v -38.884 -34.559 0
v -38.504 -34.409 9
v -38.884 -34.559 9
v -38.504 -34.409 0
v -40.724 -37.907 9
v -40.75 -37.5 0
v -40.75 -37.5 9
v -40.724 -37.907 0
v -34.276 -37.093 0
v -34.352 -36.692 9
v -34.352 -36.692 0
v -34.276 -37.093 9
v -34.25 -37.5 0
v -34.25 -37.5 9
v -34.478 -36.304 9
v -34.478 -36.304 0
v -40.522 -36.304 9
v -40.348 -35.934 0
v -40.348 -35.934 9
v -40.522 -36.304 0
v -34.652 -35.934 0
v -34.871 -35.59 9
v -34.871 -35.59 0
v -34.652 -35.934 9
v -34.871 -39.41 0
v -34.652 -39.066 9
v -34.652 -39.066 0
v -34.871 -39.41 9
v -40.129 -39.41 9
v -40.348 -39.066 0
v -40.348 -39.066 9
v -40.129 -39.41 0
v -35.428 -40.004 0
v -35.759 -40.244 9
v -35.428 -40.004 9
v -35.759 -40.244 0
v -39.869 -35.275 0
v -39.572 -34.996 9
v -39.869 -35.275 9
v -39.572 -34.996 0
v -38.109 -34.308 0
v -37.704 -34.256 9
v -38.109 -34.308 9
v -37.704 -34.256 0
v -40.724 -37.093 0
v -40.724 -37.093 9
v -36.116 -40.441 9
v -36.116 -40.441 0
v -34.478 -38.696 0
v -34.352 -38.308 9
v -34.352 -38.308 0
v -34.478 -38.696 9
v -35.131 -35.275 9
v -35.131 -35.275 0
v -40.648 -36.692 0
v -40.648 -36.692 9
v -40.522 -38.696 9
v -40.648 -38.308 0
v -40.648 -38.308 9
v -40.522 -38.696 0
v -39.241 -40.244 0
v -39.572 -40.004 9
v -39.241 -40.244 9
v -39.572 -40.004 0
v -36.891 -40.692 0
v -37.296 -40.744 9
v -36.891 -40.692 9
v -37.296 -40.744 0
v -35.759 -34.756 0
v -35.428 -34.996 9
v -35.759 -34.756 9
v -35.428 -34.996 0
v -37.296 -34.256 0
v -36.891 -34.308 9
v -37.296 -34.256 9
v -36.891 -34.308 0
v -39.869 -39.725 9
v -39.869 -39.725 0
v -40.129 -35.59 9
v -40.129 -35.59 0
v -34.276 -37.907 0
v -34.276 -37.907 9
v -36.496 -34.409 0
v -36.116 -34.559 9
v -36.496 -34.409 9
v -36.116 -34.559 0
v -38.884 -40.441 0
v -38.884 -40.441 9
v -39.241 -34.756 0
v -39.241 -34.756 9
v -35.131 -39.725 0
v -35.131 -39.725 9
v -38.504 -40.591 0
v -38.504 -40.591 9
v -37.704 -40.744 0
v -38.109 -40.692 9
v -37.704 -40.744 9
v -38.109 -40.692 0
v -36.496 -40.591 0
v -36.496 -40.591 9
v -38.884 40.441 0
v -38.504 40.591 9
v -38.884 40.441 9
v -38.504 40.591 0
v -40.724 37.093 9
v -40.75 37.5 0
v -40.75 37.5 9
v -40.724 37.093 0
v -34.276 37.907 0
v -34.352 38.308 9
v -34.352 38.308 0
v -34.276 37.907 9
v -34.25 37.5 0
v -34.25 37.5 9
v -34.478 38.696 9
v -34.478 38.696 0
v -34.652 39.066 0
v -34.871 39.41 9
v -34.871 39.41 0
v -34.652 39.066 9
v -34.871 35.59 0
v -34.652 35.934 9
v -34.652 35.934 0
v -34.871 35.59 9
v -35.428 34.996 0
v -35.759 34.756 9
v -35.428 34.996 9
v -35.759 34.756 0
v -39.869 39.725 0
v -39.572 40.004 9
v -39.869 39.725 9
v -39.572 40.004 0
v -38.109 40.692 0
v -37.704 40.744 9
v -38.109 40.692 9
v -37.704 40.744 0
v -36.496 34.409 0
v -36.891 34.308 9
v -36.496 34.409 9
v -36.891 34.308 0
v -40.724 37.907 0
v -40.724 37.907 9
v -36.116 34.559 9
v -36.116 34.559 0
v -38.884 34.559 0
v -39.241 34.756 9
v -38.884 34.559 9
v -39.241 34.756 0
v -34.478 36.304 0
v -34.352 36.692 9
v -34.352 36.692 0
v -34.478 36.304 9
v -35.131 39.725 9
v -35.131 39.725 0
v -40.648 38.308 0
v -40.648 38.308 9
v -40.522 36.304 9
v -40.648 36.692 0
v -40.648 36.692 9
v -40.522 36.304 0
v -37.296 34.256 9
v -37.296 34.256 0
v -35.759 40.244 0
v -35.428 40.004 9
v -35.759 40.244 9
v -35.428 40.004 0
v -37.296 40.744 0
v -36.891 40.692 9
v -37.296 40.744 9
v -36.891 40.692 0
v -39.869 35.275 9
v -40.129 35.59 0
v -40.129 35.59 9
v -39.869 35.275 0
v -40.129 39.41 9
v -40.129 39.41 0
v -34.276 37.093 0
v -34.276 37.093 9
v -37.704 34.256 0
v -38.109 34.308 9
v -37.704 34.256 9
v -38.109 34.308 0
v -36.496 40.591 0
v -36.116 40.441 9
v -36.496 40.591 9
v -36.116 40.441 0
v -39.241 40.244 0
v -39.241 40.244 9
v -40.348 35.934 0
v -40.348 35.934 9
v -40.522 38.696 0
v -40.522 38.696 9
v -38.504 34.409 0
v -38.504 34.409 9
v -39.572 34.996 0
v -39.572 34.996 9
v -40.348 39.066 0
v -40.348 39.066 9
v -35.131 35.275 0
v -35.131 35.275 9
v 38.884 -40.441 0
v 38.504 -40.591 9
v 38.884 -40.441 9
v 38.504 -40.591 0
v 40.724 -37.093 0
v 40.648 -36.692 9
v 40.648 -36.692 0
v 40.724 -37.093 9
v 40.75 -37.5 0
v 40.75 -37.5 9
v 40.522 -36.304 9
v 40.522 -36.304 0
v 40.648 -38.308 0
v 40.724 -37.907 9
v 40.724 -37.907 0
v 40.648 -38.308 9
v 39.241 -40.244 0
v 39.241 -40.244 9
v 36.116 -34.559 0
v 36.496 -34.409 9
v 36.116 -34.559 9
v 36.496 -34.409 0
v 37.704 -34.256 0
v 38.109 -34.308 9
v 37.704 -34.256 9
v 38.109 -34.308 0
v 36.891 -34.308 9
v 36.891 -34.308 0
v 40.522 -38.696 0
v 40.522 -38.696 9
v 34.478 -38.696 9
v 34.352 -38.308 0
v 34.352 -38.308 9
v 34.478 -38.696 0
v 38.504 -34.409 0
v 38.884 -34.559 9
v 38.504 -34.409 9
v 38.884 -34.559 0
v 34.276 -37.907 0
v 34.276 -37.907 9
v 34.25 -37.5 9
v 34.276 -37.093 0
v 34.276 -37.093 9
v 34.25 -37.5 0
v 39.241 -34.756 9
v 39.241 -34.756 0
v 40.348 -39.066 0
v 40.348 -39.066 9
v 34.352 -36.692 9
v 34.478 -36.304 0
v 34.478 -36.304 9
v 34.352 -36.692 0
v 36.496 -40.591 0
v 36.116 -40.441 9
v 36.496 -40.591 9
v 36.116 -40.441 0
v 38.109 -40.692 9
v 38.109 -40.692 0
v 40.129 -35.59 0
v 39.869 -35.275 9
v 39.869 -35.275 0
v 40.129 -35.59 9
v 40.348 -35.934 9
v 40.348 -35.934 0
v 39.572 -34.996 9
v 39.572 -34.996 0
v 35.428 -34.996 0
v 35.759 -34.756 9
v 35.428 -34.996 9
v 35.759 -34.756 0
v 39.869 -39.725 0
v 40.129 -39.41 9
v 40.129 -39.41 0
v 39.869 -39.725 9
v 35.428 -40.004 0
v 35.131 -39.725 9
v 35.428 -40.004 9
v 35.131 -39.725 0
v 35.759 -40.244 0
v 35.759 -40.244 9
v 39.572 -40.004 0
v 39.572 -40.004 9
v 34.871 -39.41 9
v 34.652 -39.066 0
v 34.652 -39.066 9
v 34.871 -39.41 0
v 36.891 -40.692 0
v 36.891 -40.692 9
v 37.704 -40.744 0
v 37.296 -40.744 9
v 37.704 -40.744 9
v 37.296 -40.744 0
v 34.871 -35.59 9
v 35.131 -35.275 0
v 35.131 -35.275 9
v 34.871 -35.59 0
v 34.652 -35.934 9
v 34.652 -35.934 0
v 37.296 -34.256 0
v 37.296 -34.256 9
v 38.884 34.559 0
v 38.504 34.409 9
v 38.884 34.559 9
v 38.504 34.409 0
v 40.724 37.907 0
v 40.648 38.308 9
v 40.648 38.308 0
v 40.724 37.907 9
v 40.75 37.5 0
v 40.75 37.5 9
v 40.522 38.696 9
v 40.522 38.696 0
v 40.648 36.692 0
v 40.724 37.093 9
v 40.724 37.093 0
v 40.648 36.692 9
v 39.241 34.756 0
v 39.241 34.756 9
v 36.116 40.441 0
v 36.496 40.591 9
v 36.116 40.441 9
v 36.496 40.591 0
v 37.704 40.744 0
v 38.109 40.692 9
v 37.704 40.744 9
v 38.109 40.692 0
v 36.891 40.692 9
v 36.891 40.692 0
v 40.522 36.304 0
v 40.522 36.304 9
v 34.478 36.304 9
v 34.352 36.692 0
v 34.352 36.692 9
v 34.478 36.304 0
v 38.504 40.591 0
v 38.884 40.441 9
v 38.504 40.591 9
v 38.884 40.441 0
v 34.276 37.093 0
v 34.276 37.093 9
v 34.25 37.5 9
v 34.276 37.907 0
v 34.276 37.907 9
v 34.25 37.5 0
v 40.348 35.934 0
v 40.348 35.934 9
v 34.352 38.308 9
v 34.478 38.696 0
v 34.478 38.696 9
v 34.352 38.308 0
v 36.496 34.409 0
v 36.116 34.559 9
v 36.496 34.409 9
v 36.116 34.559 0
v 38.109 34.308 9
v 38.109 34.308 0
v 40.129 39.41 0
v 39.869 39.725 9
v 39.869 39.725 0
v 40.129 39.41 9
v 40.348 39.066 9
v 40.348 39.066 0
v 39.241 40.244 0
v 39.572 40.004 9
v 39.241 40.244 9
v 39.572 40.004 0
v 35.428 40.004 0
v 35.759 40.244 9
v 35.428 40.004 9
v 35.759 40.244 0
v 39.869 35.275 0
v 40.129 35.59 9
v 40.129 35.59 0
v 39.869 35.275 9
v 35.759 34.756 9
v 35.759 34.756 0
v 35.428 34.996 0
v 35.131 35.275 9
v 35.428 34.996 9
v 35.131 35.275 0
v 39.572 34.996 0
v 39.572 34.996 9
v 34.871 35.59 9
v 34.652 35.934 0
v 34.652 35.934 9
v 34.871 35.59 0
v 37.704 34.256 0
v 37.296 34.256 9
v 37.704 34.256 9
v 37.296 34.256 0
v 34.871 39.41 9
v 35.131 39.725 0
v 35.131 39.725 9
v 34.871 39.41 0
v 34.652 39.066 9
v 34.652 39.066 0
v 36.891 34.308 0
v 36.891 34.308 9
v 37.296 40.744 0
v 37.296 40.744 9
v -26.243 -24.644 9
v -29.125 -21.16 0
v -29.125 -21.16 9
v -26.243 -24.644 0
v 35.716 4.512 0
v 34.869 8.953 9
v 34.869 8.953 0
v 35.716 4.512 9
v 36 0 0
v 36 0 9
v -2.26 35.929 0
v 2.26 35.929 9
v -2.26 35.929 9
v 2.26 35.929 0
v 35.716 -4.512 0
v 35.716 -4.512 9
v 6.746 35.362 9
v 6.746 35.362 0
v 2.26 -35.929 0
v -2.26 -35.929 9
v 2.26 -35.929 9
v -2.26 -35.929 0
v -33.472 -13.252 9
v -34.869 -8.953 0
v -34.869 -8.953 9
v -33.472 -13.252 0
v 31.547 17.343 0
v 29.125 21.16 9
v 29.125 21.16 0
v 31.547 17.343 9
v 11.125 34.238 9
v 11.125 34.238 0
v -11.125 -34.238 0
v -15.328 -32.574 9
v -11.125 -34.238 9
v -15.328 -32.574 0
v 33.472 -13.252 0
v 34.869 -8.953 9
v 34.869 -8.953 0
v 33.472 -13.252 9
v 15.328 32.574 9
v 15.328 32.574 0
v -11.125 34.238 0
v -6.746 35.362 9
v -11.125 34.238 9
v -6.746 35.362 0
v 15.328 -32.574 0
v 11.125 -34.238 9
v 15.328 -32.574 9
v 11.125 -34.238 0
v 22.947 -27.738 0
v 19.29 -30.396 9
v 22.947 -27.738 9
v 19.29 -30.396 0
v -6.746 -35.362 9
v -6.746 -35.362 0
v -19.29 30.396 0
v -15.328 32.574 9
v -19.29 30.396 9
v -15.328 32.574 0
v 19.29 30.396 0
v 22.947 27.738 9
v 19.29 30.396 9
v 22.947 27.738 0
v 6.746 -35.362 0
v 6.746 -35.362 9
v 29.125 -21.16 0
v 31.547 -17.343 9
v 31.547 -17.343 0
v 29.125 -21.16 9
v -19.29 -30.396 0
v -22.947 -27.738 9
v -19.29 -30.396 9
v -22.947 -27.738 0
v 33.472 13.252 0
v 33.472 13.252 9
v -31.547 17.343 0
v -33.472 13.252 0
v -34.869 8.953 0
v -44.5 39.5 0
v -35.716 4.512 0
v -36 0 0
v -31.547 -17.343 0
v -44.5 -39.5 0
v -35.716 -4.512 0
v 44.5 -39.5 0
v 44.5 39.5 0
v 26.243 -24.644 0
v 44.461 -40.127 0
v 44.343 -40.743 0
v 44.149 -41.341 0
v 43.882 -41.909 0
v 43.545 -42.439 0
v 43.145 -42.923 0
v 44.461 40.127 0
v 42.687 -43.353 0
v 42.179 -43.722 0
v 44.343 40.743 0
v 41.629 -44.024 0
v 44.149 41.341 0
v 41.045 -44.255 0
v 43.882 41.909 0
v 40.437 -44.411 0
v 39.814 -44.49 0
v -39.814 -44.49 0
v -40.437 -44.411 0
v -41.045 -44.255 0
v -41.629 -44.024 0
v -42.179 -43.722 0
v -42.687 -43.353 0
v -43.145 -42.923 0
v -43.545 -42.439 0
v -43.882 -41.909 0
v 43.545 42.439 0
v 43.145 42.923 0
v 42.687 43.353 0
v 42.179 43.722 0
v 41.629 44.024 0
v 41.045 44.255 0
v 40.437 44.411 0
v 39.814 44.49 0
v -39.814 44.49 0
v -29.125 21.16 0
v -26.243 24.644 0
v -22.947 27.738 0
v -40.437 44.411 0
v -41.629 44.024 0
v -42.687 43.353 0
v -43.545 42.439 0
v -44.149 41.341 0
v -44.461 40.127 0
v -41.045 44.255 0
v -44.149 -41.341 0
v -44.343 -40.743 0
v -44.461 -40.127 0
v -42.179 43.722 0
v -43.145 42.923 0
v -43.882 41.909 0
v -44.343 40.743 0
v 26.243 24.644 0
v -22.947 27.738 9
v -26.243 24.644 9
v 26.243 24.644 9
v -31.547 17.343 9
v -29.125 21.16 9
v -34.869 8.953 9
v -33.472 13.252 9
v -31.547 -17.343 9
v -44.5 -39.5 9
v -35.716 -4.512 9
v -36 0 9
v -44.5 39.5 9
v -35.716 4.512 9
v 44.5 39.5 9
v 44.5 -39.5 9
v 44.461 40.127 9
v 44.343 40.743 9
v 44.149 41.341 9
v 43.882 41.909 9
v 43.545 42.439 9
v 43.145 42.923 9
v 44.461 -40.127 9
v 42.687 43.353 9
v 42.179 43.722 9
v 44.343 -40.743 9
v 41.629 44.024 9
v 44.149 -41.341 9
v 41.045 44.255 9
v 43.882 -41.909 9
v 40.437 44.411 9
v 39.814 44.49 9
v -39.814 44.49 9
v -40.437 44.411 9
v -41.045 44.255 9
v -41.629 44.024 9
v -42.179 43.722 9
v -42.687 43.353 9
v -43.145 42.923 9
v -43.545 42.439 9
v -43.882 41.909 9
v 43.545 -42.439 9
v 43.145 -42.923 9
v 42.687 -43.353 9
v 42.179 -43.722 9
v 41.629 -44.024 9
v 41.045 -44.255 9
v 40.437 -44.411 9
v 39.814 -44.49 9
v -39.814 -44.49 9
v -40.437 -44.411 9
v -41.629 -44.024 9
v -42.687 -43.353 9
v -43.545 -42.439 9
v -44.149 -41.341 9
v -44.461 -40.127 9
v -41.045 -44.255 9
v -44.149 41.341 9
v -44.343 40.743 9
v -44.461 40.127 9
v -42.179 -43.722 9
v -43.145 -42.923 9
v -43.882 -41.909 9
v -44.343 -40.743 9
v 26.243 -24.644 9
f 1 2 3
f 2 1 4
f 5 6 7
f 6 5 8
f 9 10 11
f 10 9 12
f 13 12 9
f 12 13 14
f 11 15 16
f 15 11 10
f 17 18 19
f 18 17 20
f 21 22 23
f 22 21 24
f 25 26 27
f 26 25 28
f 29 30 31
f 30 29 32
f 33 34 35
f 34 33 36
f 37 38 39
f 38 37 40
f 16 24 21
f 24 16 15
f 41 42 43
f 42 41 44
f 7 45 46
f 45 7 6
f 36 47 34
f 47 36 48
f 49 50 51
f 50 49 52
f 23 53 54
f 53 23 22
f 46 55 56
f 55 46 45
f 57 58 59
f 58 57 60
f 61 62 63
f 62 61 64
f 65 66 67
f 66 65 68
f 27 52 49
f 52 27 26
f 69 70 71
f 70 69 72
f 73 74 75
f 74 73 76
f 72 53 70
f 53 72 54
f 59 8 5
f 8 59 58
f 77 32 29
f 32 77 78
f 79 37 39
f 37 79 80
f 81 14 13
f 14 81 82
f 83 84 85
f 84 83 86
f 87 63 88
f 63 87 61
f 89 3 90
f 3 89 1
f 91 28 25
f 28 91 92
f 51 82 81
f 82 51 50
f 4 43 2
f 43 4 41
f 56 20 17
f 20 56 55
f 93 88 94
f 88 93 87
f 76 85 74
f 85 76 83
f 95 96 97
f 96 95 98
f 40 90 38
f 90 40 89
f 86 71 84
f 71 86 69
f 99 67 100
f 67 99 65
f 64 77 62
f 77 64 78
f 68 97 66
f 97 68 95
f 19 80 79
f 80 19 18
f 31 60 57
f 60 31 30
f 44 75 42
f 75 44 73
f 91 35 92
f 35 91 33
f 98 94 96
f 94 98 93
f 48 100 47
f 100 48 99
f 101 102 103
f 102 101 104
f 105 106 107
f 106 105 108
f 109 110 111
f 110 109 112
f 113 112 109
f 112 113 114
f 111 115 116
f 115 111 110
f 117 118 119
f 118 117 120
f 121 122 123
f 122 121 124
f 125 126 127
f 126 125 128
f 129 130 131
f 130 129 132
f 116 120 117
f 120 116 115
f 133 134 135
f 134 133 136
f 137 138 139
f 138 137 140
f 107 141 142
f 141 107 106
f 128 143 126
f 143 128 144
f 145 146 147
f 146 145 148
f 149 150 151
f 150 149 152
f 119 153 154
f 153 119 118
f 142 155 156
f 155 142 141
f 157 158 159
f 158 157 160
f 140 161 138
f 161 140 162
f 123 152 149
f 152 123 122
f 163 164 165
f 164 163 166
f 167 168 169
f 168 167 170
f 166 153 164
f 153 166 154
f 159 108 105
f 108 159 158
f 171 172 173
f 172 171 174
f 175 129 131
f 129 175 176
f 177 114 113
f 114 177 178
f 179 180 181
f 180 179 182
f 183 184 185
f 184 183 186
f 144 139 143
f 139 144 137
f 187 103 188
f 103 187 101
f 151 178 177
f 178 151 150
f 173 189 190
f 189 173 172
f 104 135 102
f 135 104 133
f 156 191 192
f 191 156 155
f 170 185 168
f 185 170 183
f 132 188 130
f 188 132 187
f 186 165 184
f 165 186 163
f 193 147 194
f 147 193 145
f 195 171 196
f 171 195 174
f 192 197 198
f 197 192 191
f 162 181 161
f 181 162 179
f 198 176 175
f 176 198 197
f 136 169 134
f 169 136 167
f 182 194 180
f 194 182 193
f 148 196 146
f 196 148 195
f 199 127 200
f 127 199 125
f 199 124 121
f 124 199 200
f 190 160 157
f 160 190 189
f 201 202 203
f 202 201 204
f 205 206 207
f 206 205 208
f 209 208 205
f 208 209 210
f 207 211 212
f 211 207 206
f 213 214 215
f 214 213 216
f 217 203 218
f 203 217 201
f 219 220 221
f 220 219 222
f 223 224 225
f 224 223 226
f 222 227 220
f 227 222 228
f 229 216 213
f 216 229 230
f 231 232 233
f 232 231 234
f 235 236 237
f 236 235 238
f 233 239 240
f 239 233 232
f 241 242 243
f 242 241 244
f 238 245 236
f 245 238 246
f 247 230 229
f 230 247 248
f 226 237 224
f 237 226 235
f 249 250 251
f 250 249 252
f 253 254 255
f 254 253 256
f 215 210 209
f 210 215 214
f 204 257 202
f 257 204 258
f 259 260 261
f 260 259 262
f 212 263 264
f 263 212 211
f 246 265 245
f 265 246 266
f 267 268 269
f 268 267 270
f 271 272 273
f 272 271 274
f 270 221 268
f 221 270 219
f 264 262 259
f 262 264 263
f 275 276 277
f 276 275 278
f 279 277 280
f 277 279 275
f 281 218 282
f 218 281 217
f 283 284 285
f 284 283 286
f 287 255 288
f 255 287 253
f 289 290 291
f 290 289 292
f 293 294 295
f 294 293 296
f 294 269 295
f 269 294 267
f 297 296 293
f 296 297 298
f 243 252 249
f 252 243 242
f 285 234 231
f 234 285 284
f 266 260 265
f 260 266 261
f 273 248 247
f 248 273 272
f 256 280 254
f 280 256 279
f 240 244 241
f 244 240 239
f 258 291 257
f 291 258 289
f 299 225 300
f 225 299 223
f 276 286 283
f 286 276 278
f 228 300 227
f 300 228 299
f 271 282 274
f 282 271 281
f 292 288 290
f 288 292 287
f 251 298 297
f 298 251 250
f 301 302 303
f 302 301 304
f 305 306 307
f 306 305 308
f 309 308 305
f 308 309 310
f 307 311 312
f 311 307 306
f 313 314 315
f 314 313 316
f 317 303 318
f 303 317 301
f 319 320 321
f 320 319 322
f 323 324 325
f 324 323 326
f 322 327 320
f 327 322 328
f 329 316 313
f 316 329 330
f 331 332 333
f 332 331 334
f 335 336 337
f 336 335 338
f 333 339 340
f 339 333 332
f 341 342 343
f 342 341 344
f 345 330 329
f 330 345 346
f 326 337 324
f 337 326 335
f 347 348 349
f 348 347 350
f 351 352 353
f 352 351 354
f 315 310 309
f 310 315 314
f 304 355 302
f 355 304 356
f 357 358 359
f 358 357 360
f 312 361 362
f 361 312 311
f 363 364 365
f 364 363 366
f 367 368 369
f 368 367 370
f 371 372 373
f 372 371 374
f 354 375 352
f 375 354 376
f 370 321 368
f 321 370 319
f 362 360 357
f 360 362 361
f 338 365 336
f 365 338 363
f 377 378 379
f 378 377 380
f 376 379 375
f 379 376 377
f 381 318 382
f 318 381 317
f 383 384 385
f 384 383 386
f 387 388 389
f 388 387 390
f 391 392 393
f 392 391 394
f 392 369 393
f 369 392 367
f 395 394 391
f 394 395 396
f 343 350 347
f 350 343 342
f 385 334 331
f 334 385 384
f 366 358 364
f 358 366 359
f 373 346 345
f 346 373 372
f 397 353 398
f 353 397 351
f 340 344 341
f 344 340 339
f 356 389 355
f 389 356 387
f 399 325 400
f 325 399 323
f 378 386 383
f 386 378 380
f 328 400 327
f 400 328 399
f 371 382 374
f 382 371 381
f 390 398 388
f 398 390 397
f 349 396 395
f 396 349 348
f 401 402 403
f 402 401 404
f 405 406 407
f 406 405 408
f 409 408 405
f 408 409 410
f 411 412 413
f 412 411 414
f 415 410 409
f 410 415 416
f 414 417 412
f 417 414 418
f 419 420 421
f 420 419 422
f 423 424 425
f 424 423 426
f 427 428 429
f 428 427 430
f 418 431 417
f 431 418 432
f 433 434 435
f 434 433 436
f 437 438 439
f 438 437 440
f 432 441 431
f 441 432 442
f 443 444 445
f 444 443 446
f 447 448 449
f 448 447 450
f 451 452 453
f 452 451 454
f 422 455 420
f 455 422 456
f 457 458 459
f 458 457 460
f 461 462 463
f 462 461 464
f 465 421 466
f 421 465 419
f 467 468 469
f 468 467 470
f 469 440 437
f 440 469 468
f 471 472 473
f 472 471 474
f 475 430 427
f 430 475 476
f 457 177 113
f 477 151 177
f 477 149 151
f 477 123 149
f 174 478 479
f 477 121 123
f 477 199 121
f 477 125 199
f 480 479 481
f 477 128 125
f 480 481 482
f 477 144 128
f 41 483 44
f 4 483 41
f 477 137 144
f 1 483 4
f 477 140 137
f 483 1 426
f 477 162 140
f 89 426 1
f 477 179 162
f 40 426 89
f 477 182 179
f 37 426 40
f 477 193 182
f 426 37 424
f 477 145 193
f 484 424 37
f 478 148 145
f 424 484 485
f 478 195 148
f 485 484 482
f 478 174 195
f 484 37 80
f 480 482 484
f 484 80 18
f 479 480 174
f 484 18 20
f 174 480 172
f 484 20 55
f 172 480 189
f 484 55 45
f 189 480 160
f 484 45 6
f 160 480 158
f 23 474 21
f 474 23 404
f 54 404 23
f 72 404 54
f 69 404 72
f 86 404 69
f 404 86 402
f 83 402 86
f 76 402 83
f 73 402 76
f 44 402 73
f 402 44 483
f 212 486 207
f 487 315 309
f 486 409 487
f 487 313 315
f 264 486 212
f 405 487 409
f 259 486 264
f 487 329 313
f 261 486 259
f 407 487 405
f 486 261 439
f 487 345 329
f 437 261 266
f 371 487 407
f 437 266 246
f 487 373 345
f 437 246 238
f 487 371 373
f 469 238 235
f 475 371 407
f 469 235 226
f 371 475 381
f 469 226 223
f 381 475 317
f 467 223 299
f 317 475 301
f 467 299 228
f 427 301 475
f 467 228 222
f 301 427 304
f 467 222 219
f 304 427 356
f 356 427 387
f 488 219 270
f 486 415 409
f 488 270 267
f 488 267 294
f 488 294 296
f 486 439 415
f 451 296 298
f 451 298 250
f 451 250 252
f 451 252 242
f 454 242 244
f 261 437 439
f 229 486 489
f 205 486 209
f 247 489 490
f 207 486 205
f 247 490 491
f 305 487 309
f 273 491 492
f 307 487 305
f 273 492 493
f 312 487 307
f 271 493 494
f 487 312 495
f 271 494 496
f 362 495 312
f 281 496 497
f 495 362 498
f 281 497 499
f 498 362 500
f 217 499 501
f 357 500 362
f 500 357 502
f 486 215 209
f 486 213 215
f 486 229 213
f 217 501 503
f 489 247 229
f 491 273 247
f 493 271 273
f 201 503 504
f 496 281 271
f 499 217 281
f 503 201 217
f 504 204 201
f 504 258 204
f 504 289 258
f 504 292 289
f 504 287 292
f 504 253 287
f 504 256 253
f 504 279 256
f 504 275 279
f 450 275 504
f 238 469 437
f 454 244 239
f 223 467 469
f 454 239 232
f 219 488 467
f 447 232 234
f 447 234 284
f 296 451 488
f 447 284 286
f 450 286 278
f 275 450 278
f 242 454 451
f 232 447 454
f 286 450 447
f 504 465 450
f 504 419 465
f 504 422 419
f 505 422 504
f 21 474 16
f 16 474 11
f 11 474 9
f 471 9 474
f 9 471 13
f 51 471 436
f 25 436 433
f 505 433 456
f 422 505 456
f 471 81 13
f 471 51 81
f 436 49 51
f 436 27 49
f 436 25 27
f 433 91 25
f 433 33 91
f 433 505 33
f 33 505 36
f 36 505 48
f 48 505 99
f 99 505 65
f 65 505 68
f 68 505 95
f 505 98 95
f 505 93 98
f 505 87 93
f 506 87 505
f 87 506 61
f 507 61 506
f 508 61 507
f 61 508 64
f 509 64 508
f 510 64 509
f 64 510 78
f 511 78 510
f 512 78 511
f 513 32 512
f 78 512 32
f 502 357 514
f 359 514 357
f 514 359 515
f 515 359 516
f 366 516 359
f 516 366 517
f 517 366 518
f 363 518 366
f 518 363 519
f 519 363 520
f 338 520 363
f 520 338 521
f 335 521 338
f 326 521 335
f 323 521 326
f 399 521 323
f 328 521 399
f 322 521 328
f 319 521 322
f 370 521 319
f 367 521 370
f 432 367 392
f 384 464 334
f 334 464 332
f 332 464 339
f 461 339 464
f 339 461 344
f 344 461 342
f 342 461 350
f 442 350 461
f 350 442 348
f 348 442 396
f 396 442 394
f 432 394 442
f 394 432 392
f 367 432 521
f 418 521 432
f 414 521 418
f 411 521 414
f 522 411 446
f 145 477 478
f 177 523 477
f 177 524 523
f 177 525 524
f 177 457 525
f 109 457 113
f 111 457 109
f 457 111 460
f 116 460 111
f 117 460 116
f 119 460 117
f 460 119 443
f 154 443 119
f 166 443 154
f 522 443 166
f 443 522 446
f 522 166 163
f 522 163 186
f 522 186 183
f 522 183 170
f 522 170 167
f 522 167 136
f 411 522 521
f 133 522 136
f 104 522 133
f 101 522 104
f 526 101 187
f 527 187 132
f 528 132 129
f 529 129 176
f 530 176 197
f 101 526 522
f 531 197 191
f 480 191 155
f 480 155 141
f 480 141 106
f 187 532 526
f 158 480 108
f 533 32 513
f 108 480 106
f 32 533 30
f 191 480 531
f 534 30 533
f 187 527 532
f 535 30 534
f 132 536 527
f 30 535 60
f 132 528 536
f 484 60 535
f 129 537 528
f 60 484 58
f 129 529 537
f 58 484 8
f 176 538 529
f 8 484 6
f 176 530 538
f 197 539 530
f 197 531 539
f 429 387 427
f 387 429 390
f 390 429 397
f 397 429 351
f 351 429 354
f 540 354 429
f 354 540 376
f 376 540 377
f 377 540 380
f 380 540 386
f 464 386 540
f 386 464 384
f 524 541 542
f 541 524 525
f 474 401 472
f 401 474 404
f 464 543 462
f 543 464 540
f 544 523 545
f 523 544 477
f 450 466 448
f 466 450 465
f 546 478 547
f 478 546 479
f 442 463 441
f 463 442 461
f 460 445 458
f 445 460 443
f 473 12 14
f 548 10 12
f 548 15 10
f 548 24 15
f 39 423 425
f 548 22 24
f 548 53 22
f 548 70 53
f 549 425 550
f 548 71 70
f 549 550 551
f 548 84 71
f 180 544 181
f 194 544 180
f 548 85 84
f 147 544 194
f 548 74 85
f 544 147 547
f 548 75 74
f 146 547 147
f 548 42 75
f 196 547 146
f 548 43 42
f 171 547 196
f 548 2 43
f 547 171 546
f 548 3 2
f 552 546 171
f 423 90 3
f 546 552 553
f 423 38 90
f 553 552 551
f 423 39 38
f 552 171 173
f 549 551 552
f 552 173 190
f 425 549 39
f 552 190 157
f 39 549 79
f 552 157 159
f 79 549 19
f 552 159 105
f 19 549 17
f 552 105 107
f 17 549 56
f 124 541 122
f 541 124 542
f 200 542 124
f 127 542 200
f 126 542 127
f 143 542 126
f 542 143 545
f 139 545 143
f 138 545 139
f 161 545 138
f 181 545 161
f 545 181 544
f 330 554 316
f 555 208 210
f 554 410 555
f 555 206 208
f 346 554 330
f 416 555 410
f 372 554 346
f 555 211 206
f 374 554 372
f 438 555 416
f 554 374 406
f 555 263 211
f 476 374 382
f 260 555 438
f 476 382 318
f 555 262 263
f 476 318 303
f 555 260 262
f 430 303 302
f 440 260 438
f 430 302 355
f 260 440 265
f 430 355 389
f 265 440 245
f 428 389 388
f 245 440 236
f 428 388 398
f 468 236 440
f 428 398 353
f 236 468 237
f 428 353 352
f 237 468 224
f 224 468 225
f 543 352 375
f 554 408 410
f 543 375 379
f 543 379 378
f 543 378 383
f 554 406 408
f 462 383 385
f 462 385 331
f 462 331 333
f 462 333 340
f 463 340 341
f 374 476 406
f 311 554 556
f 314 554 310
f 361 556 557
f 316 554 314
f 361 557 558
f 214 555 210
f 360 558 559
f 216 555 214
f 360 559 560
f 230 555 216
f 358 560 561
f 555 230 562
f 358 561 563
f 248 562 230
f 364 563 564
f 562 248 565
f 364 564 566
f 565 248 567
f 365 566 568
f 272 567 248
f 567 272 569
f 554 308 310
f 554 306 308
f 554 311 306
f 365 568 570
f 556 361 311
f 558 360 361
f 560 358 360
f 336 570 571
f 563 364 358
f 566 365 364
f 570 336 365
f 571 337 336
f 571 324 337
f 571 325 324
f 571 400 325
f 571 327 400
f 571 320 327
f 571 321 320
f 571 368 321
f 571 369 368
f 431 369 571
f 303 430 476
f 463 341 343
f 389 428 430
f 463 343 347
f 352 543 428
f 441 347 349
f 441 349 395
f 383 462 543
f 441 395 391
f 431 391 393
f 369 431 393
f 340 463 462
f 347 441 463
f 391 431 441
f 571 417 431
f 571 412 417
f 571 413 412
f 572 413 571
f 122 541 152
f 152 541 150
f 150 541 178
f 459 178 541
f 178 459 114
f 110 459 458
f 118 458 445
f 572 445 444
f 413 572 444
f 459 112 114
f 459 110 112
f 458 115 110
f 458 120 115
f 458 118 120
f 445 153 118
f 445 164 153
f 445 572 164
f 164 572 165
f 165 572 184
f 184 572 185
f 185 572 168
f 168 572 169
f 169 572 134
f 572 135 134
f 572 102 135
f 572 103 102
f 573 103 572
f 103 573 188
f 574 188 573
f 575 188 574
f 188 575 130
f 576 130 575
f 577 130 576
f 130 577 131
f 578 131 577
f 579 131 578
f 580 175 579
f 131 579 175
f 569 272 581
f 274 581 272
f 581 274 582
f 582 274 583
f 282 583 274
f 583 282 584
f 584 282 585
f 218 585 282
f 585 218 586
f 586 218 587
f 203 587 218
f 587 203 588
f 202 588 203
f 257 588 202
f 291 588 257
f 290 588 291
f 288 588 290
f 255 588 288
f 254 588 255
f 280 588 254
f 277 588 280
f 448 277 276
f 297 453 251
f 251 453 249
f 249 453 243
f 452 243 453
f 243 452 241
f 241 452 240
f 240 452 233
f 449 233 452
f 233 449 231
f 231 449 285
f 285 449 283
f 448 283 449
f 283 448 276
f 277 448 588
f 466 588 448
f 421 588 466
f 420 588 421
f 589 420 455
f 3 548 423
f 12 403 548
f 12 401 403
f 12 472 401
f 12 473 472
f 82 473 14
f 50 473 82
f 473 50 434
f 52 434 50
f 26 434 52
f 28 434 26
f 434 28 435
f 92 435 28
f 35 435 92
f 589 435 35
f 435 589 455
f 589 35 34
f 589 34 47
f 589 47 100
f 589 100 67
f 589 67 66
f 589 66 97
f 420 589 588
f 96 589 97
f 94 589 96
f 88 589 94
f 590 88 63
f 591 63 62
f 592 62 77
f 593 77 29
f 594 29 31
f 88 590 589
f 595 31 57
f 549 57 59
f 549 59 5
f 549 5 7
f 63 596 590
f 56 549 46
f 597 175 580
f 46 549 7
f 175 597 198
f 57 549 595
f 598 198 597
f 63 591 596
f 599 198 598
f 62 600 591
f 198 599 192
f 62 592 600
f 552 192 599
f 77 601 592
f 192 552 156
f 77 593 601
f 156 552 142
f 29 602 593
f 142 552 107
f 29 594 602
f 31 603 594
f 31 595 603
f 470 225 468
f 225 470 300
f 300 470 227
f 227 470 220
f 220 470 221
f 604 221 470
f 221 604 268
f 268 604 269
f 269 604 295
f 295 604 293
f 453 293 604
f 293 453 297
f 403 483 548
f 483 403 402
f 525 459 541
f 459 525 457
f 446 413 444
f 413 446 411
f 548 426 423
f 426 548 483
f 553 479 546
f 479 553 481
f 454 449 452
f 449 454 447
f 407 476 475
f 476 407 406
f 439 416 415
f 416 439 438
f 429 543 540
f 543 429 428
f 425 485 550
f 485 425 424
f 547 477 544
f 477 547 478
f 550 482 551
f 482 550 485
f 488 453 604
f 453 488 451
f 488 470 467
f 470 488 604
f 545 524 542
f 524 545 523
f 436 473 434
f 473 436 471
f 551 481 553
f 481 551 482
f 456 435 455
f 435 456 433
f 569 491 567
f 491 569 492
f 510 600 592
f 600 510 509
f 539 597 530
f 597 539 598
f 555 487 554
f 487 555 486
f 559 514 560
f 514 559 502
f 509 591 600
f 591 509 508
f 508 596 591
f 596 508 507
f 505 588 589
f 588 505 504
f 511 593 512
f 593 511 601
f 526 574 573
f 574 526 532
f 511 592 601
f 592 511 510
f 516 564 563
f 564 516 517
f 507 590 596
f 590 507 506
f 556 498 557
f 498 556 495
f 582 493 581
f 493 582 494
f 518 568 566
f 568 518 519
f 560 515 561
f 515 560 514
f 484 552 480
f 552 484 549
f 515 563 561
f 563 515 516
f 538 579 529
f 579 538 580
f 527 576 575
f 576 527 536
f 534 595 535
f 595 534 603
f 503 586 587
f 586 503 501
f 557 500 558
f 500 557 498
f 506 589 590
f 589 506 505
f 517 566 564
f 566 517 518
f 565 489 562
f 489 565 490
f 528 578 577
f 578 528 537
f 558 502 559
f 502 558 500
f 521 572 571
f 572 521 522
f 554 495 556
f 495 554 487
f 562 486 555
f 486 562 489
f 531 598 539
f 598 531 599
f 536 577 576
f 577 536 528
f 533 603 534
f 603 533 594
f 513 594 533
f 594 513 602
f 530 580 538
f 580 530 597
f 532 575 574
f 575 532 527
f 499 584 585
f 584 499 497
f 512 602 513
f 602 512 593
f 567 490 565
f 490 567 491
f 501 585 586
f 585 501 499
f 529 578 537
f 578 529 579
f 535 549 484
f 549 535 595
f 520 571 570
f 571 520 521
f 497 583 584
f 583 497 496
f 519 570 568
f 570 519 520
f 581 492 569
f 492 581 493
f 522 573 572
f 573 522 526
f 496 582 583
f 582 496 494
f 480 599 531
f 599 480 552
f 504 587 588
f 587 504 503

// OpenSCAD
$fn = 50;


difference() {
	union() {
		hull() {
			translate(v = [-39.5000000000, 39.5000000000, 0]) {
				cylinder(h = 9, r = 5);
			}
			translate(v = [39.5000000000, 39.5000000000, 0]) {
				cylinder(h = 9, r = 5);
			}
			translate(v = [-39.5000000000, -39.5000000000, 0]) {
				cylinder(h = 9, r = 5);
			}
			translate(v = [39.5000000000, -39.5000000000, 0]) {
				cylinder(h = 9, r = 5);
			}
		}
	}
	union() {
		#translate(v = [-37.5000000000, -37.5000000000, -100.0000000000]) {
			cylinder(h = 200, r = 3.2500000000);
		}
		#translate(v = [-37.5000000000, 37.5000000000, -100.0000000000]) {
			cylinder(h = 200, r = 3.2500000000);
		}
		#translate(v = [37.5000000000, -37.5000000000, -100.0000000000]) {
			cylinder(h = 200, r = 3.2500000000);
		}
		#translate(v = [37.5000000000, 37.5000000000, -100.0000000000]) {
			cylinder(h = 200, r = 3.2500000000);
		}
		#cylinder(h = 9, r = 36.0000000000);
	}
}
